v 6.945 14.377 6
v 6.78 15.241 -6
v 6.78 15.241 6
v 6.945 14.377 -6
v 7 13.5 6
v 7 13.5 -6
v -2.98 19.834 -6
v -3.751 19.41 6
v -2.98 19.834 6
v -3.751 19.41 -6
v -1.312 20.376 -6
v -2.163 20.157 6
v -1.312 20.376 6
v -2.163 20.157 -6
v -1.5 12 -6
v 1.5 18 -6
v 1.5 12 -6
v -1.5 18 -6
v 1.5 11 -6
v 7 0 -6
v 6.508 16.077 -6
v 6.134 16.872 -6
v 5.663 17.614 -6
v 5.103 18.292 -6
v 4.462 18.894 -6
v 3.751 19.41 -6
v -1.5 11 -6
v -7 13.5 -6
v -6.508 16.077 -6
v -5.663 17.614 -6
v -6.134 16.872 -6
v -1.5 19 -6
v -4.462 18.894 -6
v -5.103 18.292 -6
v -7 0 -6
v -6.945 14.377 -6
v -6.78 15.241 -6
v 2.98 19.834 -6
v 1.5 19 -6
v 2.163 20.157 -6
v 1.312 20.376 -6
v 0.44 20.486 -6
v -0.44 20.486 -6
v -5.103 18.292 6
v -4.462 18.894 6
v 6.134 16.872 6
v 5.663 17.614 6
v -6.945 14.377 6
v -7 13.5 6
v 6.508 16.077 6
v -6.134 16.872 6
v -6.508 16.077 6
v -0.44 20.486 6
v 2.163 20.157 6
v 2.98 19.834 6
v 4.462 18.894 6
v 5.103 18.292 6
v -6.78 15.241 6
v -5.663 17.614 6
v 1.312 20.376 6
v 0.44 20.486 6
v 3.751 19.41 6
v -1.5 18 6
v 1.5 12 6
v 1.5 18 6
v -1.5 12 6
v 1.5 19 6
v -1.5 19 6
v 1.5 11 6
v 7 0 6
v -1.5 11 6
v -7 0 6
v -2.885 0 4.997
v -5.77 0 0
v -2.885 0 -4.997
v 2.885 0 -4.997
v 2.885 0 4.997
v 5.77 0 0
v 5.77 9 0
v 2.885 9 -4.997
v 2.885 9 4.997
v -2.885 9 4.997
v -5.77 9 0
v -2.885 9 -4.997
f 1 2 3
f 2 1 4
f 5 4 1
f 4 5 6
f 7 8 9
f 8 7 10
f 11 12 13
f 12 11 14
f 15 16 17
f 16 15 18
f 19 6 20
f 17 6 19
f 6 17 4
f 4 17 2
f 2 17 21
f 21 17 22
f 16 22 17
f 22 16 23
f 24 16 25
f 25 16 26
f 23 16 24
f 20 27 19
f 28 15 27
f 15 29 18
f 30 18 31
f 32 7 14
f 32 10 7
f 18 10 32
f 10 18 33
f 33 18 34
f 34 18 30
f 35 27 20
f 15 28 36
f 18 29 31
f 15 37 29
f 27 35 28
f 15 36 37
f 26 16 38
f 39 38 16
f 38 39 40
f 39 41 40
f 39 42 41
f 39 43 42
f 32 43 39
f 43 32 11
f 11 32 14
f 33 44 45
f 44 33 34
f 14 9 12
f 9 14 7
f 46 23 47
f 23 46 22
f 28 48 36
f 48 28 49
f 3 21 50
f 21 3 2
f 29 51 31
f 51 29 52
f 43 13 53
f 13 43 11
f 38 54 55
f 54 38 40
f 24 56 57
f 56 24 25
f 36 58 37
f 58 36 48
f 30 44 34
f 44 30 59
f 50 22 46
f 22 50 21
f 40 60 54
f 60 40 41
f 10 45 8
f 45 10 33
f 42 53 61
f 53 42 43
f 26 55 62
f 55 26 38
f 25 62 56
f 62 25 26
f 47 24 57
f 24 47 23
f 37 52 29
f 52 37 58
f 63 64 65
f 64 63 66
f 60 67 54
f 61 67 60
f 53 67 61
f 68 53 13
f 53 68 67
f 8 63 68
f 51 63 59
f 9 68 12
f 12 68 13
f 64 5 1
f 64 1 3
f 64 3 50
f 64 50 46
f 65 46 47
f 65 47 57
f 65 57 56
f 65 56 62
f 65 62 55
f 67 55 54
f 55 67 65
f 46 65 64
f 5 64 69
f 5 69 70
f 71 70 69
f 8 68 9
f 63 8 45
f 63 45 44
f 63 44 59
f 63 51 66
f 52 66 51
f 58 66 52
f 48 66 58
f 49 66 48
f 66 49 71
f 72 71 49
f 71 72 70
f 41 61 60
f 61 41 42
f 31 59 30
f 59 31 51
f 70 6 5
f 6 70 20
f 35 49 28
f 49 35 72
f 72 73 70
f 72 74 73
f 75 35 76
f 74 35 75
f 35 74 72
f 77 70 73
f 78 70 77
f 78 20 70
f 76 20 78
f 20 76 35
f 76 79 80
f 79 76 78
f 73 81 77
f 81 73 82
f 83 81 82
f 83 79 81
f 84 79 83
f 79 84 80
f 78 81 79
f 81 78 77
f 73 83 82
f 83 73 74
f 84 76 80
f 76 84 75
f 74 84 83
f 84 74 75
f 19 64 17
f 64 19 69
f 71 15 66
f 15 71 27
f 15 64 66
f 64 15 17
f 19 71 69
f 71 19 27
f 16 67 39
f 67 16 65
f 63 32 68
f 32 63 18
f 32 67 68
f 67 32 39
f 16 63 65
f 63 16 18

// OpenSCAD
$fn = 50;


difference() {
	union() {
		translate(v = [0, 13.5000000000, -6.0000000000]) {
			cylinder(h = 12, r = 7.0000000000);
		}
		translate(v = [0, 13.5000000000, -6.0000000000]) {
			cylinder(h = 12, r = 7.0000000000);
		}
		translate(v = [-7.0000000000, 0, -6.0000000000]) {
			cube(size = [14, 13.5000000000, 12]);
		}
	}
	union() {
		translate(v = [0.0000000000, 9, 0]) {
			rotate(a = [0, 0, 0]) {
				difference() {
					union() {
						rotate(a = [90, 0, 0]) {
							linear_extrude(height = 13.5000000000) {
								polygon(points = [[5.7700000000, 0.0000000000], [2.8850000000, 4.9969665798], [-2.8850000000, 4.9969665798], [-5.7700000000, 0.0000000000], [-2.8850000000, -4.9969665798], [2.8850000000, -4.9969665798]]);
							}
						}
					}
					union();
				}
			}
		}
		translate(v = [-1.5000000000, 11.0000000000, -50]) {
			cube(size = [3, 1, 100]);
		}
		translate(v = [-1.5000000000, 18.0000000000, -50]) {
			cube(size = [3, 1, 100]);
		}
		translate(v = [0.0000000000, 8, 0]) {
			rotate(a = [90, 0, 0]) {
				cylinder(h = 8, r = 3.0000000000);
			}
		}
	}
}
